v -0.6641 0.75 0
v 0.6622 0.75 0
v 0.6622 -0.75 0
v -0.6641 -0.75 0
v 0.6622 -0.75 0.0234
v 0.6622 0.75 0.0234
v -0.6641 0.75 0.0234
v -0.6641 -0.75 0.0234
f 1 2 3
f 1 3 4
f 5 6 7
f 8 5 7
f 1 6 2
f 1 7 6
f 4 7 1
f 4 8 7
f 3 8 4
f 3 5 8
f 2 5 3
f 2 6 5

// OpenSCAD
translate([-0.6640625, -0.75, 0])
rotate([0, 0, 0])
linear_extrude(height=0.0234375)
    polygon(points=[[1.3263157894736843, 0.0], [1.3263157894736843, 1.5], [0.0, 1.5], [0.0, 0.0]]);
